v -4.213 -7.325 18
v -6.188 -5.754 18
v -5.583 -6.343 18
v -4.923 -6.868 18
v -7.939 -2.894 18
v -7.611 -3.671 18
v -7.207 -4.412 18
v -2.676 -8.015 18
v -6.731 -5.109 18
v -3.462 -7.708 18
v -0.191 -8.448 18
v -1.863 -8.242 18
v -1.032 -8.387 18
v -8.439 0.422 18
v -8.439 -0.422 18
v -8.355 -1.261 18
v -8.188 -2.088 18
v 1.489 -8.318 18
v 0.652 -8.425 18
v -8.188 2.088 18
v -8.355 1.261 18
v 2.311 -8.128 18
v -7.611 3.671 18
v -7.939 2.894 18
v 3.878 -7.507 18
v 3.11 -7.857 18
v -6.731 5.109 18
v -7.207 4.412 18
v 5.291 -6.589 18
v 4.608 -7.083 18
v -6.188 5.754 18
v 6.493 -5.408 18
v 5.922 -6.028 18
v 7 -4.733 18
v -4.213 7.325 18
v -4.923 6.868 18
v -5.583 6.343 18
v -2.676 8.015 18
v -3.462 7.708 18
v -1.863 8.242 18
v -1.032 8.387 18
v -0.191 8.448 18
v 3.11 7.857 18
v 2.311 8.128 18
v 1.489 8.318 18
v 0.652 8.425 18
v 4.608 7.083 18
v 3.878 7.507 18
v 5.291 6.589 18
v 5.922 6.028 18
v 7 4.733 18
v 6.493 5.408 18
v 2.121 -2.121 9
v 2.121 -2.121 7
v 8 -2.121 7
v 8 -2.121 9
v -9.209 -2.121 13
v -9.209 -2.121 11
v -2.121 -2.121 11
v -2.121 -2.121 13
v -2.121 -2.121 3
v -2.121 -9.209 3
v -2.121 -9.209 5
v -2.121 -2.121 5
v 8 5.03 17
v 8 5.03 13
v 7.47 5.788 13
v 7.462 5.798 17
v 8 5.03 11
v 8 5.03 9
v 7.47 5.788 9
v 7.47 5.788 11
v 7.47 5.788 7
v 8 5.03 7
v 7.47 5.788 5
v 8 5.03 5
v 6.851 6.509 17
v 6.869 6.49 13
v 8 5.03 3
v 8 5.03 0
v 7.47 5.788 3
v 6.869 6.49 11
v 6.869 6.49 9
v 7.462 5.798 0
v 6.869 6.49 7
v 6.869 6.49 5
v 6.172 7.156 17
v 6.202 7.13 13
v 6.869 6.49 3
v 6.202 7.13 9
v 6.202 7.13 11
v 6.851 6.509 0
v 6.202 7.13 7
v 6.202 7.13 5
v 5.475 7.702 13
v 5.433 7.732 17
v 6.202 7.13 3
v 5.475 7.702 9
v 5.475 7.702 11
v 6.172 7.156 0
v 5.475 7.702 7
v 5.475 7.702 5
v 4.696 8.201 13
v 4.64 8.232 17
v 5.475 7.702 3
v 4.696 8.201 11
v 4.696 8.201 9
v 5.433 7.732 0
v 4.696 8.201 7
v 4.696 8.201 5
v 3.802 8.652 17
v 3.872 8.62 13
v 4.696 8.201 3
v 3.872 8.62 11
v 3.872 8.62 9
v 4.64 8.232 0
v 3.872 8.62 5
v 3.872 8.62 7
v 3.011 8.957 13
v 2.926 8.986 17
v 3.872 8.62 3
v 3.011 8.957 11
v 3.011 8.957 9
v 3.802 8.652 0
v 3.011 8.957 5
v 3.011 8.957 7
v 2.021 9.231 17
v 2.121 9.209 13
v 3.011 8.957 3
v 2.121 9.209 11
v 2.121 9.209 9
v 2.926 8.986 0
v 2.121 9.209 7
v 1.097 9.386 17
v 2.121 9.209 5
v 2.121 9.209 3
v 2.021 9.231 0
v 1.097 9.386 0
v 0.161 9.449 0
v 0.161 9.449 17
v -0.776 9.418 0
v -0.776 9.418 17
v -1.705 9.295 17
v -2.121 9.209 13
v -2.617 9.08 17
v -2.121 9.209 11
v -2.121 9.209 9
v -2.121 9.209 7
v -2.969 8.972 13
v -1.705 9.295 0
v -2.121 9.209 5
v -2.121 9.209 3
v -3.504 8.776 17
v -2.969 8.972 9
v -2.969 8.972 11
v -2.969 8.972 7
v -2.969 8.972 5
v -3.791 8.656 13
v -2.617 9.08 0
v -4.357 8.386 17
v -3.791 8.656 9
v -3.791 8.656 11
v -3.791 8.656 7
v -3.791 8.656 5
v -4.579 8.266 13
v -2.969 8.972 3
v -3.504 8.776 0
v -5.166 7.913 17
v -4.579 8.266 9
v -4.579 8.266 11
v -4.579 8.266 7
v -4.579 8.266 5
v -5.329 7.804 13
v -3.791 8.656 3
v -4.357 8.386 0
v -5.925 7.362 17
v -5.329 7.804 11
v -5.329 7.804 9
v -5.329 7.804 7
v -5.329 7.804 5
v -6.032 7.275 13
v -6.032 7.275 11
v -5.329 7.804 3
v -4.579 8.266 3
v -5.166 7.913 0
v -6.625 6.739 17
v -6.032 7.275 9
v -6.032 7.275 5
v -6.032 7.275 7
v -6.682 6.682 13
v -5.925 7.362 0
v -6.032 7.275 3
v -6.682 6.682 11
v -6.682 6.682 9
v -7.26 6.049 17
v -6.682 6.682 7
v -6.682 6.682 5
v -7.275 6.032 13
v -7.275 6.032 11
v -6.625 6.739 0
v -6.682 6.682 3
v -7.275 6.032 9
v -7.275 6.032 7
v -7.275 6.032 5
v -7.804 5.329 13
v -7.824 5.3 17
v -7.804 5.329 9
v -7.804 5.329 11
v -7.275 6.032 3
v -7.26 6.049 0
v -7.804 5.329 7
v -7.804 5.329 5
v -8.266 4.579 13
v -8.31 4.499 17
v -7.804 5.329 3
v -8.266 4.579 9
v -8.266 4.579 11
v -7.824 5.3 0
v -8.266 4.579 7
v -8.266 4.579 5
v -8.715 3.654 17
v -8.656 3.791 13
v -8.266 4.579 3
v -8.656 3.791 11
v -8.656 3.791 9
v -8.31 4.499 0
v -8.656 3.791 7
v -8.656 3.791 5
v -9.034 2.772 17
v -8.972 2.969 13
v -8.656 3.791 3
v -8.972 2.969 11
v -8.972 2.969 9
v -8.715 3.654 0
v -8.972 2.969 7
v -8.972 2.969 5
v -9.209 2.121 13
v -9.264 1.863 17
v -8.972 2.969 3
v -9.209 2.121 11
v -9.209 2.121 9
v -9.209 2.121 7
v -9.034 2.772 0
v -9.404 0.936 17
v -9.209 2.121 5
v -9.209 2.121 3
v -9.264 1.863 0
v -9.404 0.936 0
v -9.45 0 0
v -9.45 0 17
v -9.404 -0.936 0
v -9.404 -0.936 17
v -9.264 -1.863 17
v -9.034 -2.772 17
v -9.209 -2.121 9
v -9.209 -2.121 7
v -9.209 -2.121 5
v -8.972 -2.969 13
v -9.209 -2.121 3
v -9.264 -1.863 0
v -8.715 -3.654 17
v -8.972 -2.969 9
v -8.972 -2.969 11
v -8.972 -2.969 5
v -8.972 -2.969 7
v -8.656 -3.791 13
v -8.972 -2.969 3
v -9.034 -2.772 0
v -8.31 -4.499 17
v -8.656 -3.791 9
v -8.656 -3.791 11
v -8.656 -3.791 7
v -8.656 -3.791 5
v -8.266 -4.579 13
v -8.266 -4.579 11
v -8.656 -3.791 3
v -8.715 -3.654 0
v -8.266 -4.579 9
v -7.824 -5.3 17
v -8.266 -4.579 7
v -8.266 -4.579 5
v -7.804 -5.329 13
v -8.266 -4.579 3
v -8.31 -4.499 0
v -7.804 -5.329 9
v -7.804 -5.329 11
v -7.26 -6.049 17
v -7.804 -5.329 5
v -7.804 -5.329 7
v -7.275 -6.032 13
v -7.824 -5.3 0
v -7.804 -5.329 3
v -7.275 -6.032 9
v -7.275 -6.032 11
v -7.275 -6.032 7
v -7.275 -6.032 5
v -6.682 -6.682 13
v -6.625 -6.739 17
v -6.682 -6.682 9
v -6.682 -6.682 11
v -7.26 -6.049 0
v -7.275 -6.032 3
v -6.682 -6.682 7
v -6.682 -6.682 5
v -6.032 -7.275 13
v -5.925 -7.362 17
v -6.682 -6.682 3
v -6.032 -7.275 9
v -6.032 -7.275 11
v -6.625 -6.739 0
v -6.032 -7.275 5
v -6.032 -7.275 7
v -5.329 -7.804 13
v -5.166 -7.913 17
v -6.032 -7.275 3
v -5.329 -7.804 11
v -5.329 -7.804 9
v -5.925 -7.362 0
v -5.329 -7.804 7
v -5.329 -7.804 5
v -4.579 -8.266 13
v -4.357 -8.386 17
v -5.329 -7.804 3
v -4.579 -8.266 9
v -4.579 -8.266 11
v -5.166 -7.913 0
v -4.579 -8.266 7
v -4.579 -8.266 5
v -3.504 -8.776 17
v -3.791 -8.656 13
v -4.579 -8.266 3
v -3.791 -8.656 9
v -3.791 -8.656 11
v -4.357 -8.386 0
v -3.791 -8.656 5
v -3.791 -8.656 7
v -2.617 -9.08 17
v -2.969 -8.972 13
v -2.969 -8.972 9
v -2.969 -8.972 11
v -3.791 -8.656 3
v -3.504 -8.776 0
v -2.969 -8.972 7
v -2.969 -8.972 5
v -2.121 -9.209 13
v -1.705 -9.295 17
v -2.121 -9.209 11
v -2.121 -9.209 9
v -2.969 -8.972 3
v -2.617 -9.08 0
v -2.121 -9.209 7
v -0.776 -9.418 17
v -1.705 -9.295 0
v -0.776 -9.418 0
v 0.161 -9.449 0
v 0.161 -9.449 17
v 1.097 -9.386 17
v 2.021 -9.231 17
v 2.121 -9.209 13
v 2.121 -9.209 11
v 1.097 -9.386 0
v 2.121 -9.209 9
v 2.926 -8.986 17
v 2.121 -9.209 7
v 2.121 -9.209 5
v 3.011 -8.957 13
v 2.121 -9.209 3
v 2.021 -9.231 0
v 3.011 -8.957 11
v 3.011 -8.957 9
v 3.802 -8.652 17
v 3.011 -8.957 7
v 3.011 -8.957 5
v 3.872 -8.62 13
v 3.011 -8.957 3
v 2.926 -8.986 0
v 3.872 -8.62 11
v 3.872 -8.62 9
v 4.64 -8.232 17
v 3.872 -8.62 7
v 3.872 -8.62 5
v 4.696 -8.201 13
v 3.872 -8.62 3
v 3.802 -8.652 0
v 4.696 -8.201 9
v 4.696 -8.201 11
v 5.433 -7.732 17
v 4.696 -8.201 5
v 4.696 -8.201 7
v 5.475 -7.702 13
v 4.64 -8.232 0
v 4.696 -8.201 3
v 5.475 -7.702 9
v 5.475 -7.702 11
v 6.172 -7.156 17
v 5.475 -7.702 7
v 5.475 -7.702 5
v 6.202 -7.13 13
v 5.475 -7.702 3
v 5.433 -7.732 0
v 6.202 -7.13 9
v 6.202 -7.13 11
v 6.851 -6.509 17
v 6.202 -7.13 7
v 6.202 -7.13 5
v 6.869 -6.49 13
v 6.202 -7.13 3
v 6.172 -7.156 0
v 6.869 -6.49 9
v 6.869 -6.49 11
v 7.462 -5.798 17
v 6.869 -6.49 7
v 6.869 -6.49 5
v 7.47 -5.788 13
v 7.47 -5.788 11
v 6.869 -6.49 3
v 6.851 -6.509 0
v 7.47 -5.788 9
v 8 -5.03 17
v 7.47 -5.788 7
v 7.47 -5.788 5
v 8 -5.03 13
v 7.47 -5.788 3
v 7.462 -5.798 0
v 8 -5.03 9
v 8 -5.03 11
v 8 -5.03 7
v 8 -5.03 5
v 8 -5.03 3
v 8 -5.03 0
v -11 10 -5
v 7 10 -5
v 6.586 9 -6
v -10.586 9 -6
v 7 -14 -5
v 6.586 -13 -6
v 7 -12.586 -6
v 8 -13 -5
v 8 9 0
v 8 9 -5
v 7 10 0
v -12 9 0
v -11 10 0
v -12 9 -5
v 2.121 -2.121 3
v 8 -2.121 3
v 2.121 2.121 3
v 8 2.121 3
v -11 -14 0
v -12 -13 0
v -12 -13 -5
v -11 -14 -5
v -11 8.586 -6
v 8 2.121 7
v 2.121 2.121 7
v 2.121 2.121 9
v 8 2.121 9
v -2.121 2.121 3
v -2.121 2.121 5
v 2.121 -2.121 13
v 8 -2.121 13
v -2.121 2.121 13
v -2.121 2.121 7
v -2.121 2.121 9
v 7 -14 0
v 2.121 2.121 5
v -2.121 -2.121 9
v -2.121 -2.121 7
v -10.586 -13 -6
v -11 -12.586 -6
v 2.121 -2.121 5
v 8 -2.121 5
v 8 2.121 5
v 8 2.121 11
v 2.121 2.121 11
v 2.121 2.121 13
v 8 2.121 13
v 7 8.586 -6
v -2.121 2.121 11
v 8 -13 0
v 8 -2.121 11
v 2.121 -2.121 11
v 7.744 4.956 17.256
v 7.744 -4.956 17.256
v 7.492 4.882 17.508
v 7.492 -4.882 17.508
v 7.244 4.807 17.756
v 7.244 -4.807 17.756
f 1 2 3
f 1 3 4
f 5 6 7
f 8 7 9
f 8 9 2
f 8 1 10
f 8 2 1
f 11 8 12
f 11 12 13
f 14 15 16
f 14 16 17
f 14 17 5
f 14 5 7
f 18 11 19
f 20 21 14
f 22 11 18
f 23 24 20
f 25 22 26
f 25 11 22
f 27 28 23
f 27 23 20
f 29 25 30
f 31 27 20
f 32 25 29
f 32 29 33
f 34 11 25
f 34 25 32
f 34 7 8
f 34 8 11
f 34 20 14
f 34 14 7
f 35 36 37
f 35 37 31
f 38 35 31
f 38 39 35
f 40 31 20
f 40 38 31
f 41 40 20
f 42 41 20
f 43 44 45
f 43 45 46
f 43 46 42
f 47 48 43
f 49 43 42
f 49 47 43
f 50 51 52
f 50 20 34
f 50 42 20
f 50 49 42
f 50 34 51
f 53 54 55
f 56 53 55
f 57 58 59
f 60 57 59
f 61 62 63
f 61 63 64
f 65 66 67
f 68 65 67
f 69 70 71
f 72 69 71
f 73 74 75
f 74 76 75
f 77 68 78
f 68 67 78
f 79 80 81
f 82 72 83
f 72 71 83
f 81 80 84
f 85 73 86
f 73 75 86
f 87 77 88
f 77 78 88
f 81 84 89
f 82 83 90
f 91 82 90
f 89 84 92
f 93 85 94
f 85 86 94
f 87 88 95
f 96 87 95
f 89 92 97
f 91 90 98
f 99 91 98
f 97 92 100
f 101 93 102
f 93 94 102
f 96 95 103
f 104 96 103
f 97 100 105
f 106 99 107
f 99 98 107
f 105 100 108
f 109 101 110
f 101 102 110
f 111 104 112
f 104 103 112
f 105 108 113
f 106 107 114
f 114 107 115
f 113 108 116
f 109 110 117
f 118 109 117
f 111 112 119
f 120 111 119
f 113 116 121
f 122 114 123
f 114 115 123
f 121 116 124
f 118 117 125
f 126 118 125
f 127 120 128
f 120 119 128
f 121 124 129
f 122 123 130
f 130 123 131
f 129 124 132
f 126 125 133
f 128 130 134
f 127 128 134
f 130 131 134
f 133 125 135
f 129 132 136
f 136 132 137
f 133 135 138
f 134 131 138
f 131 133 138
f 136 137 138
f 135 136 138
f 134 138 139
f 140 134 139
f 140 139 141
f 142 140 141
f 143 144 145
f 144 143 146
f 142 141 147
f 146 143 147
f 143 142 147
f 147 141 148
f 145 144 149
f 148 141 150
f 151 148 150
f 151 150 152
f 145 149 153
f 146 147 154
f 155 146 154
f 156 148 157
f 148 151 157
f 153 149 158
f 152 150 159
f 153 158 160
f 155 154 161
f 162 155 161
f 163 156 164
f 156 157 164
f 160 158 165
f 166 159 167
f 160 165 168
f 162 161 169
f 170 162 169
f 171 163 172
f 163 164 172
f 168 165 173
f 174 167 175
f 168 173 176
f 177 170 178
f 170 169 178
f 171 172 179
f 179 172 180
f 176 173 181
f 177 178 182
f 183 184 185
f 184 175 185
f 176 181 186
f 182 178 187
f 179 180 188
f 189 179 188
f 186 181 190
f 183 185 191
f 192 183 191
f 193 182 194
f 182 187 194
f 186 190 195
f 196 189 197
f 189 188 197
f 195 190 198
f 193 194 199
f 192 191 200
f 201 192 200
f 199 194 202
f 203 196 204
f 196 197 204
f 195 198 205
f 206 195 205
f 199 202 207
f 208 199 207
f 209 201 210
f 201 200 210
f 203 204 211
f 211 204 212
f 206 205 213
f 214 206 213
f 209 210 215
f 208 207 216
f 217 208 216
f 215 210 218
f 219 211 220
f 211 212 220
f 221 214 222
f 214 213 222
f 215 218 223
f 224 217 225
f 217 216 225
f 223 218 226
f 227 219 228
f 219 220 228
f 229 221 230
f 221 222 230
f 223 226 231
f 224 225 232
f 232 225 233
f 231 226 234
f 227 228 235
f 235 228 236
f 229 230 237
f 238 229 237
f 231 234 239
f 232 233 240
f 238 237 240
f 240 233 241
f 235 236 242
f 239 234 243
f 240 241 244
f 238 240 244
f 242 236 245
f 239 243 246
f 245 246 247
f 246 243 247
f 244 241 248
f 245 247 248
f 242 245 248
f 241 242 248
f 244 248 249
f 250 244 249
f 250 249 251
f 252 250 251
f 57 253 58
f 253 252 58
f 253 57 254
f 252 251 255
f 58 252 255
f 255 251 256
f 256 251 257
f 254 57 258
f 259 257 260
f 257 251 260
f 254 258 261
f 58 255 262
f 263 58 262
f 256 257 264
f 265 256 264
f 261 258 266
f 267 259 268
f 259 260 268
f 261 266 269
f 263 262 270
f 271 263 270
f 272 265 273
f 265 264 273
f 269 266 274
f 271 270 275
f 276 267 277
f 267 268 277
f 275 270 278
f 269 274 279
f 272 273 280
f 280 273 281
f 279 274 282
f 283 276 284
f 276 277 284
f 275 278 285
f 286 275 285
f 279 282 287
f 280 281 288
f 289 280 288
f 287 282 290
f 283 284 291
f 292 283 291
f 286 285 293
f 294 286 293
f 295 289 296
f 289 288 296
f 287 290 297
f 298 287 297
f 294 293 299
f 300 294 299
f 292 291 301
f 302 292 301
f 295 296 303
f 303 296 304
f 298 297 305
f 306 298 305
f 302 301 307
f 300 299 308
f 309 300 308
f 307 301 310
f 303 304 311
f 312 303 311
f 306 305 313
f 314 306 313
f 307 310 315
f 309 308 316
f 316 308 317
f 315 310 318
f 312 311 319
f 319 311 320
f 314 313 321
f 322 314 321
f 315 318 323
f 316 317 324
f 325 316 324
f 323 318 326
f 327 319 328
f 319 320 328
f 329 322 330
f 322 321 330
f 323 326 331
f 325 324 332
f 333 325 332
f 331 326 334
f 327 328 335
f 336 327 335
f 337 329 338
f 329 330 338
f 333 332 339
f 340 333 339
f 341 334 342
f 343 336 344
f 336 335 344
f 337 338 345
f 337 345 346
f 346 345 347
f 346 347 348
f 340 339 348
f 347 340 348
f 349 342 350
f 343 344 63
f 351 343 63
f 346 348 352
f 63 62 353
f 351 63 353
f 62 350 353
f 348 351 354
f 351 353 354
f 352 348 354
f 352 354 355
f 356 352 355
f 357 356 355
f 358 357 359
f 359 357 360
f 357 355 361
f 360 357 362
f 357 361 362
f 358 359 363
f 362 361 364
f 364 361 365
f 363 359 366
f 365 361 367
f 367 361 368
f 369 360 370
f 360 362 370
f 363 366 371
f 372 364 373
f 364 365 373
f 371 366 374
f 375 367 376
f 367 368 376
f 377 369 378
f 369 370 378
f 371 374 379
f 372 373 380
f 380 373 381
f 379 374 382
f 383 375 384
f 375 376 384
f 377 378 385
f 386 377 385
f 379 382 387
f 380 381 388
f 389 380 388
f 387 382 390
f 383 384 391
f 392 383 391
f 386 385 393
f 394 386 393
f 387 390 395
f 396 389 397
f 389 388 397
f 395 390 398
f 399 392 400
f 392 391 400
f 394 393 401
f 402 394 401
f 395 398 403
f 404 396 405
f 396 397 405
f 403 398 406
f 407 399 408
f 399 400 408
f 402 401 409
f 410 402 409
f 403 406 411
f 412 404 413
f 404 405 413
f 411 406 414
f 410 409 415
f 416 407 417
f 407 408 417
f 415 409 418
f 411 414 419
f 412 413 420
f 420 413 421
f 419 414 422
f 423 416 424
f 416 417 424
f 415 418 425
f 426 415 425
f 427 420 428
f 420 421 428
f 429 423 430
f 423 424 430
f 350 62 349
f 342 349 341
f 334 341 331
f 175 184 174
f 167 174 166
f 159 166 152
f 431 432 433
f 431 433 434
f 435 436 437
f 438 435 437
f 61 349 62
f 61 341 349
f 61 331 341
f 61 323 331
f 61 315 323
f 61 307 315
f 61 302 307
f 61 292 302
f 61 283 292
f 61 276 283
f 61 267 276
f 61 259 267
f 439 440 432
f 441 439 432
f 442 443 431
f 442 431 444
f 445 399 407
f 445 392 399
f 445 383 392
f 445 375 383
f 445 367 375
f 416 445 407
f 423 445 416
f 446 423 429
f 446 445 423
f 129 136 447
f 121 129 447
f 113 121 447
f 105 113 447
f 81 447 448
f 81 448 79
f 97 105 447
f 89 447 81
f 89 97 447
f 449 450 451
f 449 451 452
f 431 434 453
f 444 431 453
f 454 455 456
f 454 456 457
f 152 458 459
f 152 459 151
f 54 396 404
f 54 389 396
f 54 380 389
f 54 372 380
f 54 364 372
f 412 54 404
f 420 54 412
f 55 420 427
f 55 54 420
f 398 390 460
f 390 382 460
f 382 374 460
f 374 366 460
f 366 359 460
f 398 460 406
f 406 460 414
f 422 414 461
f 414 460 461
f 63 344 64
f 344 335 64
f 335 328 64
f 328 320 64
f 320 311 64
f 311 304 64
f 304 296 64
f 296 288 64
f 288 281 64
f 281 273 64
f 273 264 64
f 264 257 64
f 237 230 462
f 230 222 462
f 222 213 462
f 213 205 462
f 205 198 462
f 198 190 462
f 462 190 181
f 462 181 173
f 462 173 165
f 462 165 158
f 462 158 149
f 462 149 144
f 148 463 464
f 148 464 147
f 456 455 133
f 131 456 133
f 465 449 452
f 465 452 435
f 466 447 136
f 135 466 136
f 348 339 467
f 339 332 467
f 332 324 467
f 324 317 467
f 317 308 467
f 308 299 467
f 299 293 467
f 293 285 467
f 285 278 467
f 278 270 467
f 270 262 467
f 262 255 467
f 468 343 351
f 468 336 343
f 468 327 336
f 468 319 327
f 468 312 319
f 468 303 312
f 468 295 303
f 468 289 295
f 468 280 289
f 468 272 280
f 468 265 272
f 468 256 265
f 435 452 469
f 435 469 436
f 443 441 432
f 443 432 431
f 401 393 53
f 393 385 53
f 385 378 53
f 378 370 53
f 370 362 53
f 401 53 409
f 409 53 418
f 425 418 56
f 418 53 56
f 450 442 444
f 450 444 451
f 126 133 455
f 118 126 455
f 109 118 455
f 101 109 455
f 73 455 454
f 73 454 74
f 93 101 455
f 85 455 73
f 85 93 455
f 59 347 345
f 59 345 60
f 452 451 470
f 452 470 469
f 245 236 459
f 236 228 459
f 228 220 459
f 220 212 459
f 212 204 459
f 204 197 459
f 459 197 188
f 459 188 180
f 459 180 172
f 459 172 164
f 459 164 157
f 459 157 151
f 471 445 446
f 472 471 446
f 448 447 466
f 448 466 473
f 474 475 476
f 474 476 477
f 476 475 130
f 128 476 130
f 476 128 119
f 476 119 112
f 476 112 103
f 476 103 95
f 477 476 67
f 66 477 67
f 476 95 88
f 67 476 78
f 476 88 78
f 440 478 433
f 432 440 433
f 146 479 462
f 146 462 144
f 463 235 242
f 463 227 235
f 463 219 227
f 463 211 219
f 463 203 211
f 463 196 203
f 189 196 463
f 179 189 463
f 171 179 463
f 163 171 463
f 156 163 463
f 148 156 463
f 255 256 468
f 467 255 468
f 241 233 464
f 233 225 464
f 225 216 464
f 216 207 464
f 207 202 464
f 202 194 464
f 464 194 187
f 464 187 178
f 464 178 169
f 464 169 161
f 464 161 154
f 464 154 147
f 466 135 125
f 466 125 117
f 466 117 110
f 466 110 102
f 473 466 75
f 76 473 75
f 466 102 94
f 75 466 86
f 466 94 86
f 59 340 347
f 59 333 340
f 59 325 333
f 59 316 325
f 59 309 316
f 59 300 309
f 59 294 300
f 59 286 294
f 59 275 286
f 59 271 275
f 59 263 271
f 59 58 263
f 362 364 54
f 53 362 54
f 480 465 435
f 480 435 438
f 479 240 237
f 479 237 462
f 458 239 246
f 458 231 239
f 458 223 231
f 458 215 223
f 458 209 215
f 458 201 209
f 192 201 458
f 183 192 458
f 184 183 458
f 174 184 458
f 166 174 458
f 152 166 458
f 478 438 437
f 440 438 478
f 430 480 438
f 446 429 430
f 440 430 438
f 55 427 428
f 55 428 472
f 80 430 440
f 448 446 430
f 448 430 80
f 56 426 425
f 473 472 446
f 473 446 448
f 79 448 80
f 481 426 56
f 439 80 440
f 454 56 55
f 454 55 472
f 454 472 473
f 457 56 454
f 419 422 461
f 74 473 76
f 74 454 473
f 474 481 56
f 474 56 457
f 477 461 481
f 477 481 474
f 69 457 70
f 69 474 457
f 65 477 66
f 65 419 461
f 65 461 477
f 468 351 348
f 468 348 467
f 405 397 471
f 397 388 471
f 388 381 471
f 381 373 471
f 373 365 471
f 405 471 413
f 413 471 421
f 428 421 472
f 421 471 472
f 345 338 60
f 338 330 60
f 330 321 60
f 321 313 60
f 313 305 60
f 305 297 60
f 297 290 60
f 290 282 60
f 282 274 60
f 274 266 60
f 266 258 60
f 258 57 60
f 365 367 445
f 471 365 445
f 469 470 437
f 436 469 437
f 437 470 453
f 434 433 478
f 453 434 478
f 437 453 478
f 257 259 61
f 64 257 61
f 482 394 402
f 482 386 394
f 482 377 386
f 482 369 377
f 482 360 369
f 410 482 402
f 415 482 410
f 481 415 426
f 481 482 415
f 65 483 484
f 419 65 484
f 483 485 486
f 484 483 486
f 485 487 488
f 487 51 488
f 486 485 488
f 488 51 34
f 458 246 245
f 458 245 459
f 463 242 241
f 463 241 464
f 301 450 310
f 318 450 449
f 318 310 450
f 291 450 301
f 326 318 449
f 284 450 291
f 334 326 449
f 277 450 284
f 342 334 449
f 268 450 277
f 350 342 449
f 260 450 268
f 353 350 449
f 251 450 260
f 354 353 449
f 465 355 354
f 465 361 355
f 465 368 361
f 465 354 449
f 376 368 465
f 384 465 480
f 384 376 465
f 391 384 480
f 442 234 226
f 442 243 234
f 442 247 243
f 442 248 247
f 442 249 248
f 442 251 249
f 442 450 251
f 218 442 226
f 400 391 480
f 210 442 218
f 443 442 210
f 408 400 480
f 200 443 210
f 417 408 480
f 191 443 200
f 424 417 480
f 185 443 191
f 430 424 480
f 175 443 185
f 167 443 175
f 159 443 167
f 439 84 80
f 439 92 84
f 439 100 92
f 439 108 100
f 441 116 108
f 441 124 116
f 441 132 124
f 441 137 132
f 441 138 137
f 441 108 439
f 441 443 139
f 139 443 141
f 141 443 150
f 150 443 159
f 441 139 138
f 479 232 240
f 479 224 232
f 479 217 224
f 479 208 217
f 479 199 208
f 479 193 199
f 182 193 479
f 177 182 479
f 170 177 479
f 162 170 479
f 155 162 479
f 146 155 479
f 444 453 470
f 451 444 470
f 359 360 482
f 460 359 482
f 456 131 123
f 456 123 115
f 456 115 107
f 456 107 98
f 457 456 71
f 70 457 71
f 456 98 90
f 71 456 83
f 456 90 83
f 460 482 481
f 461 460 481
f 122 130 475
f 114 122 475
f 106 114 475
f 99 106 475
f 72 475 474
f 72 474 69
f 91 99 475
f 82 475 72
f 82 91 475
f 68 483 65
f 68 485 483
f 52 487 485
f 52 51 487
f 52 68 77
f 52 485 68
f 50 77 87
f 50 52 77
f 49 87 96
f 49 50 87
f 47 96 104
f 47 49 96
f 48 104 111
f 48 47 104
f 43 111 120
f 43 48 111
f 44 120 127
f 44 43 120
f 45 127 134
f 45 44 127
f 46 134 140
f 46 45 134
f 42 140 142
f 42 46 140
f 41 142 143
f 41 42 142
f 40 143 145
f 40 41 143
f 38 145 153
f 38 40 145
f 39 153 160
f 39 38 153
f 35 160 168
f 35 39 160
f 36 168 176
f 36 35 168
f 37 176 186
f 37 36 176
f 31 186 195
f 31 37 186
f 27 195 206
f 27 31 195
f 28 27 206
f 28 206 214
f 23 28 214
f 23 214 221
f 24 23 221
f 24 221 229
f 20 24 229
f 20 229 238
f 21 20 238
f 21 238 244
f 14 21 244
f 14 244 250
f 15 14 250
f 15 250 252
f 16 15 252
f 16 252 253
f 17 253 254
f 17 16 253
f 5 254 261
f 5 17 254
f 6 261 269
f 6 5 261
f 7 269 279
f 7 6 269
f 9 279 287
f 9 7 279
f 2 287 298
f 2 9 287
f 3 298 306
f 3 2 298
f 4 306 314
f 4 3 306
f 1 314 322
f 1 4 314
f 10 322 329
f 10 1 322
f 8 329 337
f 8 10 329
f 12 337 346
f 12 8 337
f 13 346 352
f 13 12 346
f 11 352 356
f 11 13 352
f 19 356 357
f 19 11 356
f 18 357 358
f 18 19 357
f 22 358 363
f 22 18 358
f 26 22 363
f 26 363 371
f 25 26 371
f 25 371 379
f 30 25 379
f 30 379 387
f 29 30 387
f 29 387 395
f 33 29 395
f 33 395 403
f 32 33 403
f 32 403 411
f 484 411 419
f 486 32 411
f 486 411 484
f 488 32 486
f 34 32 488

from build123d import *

# Parameters (mm, degrees)
PAD002_DEPTH           = 18
CHAMFER001_SIZE        = 1
SKETCH004_W            = 20
SKETCH004_H            = 20
POCKET001_DEPTH        = 2
LINEARPATTERN001_COUNT = 3
LINEARPATTERN001_PITCH = 4
PAD003_DEPTH           = 6
CHAMFER002_SIZE        = 1


with BuildPart() as part:
    # Sketch003 → Pad002 (new body)
    with BuildSketch(Plane.XY):
        with BuildLine():
            ThreePointArc((8, 5.030159), (-9.45, 0), (8, -5.030159))
            Line((8, 5.030159), (8, -5.030159))
        make_face()
    extrude(amount=PAD002_DEPTH)

    # Chamfer001
    chamfer001_edges = [part.edges().sort_by_distance(p)[0] for p in [
        (-9.45, 0, 18),
        (8, 0, 18),
    ]]
    chamfer(chamfer001_edges, length=CHAMFER001_SIZE)

    # Sketch004 → Pocket001 (cut)
    with BuildSketch(Plane.XY.offset(3)):
        with Locations((12.12132, -12.12132)):
            Rectangle(SKETCH004_W, SKETCH004_H)
        with Locations((12.12132, 12.12132)):
            Rectangle(SKETCH004_W, SKETCH004_H)
        with Locations((-12.12132, 12.12132)):
            Rectangle(SKETCH004_W, SKETCH004_H)
        with Locations((-12.12132, -12.12132)):
            Rectangle(SKETCH004_W, SKETCH004_H)
    pocket001 = extrude(amount=POCKET001_DEPTH, mode=Mode.SUBTRACT)

    # LinearPattern001: Pocket001 ×3
    with Locations(*[(0, 0, i * LINEARPATTERN001_PITCH) for i in range(1, LINEARPATTERN001_COUNT)]):
        add(pocket001, mode=Mode.SUBTRACT)

    # Sketch005 → Pad003 (join)
    with BuildSketch(Plane.XY):
        Polygon((-12, 9), (-12, -13), (-11, -14), (7, -14), (8, -13), (8, 9), (7, 10), (-11, 10), align=None)
    extrude(amount=-PAD003_DEPTH)

    # Chamfer002
    chamfer002_edges = [part.edges().sort_by_distance(p)[0] for p in [
        (-2, 10, -6),
        (-11.5, 9.5, -6),
        (-12, -2, -6),
        (-11.5, -13.5, -6),
        (-2, -14, -6),
        (7.5, -13.5, -6),
        (8, -2, -6),
        (7.5, 9.5, -6),
    ]]
    chamfer(chamfer002_edges, length=CHAMFER002_SIZE)


solid = part.part
